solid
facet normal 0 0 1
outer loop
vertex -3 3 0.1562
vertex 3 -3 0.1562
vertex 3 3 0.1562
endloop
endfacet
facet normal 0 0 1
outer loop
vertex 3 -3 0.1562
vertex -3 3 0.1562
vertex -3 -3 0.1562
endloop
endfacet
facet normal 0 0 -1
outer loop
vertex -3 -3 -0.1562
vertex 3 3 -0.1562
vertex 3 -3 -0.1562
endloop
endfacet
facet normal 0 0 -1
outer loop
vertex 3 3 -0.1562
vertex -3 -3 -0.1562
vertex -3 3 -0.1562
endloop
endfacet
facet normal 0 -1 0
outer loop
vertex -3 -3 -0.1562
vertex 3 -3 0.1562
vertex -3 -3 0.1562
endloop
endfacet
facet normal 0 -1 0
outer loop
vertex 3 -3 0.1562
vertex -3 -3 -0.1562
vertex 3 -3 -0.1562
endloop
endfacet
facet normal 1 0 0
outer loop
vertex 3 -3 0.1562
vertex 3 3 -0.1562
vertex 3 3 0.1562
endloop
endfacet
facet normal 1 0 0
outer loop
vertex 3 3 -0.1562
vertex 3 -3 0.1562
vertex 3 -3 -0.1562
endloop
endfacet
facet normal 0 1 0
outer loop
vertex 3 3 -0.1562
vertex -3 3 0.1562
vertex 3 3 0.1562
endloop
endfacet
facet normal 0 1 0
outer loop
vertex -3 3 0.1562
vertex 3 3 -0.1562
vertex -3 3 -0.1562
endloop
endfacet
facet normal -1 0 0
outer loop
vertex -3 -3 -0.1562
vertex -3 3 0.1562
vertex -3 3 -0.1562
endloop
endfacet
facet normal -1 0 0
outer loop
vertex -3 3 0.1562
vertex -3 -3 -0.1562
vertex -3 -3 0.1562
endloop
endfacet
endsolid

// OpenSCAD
$fn = 64;

// Units: inches
thickness = 5/16;   // 0.3125"
width     = 6;
length    = 6;

// Single connected solid, centered at origin for reliable orthographic visibility
cube([length, width, thickness], center=true);
